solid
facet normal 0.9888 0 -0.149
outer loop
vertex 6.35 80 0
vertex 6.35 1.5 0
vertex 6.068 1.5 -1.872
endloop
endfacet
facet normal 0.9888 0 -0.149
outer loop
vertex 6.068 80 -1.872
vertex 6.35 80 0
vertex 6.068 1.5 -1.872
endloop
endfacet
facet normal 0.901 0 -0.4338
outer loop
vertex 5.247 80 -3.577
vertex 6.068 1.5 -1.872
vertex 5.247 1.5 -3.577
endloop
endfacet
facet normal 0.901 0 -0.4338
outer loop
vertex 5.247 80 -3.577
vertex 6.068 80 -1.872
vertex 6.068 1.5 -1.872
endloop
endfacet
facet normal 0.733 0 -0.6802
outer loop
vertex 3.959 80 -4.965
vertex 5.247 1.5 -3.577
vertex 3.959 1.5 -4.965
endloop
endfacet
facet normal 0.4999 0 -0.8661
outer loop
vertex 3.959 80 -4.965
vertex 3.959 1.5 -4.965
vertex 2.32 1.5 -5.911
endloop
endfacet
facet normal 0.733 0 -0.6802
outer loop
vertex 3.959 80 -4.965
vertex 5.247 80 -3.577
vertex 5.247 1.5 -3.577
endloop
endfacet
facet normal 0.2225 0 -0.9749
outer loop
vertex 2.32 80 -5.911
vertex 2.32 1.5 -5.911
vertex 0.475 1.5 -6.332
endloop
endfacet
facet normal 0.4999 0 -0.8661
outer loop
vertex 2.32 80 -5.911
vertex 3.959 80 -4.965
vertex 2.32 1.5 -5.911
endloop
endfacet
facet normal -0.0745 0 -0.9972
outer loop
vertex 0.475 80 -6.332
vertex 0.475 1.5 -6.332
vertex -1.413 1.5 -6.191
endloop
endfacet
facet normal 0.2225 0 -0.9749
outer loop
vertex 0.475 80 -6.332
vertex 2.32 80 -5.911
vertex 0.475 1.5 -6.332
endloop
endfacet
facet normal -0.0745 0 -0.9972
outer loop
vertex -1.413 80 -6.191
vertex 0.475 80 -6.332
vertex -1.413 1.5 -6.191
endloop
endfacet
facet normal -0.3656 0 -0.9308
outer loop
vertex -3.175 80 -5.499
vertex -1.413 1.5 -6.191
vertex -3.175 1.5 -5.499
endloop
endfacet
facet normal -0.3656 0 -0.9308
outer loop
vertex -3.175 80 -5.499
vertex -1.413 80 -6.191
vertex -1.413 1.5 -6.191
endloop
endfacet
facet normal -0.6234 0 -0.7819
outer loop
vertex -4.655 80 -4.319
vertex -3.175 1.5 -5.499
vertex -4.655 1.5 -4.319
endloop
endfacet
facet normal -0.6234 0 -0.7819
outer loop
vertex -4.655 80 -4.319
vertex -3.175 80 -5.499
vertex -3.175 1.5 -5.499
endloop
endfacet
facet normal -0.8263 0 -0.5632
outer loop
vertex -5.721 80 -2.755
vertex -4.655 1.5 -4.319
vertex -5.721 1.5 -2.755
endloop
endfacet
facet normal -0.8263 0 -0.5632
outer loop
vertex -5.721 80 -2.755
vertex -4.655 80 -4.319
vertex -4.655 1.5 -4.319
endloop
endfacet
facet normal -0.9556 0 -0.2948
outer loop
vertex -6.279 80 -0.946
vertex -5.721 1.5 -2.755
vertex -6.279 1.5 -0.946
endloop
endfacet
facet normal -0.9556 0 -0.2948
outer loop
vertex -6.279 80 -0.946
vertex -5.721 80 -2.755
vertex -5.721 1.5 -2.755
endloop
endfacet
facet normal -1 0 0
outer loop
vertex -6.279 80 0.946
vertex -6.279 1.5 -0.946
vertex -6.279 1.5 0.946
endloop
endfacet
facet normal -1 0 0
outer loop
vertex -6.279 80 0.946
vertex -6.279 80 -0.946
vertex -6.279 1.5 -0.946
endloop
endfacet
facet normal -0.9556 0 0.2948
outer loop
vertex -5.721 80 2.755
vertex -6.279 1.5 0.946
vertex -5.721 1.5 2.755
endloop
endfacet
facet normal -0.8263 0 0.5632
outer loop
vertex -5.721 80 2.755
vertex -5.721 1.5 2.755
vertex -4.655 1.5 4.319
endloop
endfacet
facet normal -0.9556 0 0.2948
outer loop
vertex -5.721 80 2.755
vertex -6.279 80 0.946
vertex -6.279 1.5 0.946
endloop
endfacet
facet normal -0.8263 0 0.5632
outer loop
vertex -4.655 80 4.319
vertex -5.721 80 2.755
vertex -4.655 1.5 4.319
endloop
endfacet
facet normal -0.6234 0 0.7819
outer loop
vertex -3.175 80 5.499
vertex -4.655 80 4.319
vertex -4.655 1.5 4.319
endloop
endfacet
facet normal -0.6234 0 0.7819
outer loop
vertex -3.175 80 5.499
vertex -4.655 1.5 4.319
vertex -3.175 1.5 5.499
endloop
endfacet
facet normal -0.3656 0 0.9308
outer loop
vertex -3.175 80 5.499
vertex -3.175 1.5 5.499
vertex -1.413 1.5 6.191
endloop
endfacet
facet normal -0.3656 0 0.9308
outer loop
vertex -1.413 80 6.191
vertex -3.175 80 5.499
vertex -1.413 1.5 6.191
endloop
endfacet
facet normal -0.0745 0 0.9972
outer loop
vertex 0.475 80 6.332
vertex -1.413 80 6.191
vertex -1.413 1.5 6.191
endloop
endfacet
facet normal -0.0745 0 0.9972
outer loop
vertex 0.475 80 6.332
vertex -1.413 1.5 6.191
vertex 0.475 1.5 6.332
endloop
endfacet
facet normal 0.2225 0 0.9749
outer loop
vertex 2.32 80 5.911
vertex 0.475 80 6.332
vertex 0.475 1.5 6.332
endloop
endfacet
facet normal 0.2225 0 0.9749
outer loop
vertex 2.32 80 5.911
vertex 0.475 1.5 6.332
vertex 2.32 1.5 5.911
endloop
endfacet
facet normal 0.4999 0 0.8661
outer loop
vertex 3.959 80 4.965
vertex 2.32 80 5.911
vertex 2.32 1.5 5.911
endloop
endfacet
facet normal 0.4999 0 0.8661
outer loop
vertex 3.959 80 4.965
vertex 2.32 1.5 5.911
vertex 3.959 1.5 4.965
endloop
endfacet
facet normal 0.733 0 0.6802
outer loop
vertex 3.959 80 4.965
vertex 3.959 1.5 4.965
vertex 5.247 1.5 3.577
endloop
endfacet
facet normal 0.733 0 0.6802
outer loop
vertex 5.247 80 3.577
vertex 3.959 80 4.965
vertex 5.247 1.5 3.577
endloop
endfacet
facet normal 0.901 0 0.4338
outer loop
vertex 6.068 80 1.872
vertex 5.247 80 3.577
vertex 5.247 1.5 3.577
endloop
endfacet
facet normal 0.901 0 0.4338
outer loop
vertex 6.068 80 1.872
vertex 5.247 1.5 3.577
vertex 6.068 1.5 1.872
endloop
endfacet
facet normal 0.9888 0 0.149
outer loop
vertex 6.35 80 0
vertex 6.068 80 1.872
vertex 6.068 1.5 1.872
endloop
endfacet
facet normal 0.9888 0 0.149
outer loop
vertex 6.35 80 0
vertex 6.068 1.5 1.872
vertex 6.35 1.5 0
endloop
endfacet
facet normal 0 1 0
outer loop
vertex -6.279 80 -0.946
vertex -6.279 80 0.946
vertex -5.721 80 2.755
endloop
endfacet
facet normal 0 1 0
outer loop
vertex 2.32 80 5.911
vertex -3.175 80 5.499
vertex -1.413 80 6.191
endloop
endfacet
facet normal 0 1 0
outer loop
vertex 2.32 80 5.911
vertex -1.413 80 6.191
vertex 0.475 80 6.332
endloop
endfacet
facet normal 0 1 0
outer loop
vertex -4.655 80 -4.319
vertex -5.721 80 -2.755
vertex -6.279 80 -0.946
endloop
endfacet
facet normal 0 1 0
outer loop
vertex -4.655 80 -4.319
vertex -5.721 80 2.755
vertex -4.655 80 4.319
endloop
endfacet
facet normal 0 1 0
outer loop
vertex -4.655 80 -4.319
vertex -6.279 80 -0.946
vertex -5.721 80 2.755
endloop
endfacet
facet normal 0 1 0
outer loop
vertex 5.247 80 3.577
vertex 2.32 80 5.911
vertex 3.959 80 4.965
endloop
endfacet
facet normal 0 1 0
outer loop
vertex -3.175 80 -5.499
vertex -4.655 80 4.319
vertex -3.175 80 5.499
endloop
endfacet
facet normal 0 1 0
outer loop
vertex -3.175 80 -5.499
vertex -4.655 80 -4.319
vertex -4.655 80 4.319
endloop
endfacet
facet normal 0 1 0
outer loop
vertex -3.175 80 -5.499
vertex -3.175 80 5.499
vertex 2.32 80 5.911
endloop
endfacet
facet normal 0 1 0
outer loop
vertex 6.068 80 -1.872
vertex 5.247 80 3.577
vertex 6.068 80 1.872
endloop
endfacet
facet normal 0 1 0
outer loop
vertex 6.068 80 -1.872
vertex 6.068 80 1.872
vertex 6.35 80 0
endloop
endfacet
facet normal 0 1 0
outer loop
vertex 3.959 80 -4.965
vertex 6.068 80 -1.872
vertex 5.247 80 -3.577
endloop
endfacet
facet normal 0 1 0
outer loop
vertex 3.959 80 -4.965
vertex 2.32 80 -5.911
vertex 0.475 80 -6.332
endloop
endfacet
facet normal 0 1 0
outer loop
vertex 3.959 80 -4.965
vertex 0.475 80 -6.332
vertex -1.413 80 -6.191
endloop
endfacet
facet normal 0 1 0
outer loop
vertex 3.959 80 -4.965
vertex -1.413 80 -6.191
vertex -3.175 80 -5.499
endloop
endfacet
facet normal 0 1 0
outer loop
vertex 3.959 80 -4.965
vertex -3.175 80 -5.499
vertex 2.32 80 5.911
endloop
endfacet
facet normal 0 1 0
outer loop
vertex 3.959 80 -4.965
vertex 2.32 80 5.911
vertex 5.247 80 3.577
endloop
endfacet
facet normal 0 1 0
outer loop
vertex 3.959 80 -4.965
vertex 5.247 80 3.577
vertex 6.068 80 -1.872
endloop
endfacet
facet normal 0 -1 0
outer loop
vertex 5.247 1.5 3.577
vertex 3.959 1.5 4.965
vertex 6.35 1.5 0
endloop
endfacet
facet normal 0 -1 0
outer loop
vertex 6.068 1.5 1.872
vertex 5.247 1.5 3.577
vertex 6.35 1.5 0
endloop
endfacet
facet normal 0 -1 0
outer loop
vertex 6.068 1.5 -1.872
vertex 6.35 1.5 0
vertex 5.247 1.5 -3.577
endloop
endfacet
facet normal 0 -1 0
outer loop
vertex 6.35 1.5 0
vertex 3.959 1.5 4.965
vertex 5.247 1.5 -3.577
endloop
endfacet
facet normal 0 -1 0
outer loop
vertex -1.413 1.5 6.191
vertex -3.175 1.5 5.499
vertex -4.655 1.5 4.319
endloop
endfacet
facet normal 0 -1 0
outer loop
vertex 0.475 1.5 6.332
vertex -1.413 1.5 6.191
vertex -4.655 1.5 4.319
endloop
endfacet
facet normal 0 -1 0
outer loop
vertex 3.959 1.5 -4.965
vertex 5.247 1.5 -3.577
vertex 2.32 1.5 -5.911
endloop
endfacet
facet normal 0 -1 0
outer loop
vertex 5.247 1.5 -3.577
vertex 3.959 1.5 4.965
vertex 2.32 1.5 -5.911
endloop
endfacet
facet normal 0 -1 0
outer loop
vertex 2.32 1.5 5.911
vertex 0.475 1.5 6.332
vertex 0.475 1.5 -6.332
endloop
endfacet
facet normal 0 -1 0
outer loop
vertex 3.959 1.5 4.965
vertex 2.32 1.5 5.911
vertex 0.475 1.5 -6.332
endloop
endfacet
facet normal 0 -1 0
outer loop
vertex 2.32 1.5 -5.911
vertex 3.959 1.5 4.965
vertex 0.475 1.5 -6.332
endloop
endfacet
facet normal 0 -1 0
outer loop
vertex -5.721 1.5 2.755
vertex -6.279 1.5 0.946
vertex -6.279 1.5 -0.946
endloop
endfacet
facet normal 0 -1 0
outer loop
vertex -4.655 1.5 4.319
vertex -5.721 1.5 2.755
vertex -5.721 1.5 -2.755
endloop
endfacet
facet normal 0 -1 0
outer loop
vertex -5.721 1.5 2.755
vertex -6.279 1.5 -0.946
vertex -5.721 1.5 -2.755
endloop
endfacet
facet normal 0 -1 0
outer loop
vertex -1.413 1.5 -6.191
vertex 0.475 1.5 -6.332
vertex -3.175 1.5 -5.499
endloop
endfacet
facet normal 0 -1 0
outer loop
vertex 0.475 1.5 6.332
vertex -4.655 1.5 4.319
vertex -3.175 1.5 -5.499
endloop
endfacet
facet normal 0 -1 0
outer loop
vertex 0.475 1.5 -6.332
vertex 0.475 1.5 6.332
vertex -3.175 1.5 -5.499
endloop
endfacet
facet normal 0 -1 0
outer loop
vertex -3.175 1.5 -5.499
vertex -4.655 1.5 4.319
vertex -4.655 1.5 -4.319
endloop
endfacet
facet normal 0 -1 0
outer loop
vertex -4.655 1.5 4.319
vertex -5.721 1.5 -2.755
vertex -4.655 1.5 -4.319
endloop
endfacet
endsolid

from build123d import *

# Parameters (mm, degrees)
SKETCH1_R               = 3
BOSS_EXTRUDE1_DEPTH     = 80
SKETCH2_R               = 6.35
BOSS_EXTRUDE2_DEPTH     = 600
CUT_EXTRUDE1_DEPTH      = 7
CUT_EXTRUDE1_DEPTH_BACK = 7
SKETCH3_W               = 12.7
SKETCH3_H               = 521.5


with BuildPart() as part:
    # Sketch1 → Boss-Extrude1 (new body)
    with BuildSketch(Plane(origin=(0, 0, 0), x_dir=(1, 0, 0), z_dir=(0, 1, 0))):
        Circle(SKETCH1_R)
    extrude(amount=BOSS_EXTRUDE1_DEPTH)

    # Sketch2 → Boss-Extrude2 (add)
    with BuildSketch(Plane(origin=(0, 80, 0), x_dir=(1, 0, 0), z_dir=(0, 1, 0))):
        Circle(SKETCH2_R)
    extrude(amount=-BOSS_EXTRUDE2_DEPTH)

    # Sketch3 → Cut-Extrude1 (cut, two sides: drawn at the far end of the back side and taken through both)
    with BuildSketch(Plane(origin=(0, 0, 0), x_dir=(0, 0, -1), z_dir=(1, 0, 0)).offset(-CUT_EXTRUDE1_DEPTH_BACK)):
        with Locations((0, -259.25)):
            Rectangle(SKETCH3_W, SKETCH3_H)
    extrude(amount=CUT_EXTRUDE1_DEPTH + CUT_EXTRUDE1_DEPTH_BACK, mode=Mode.SUBTRACT)


solid = part.part
